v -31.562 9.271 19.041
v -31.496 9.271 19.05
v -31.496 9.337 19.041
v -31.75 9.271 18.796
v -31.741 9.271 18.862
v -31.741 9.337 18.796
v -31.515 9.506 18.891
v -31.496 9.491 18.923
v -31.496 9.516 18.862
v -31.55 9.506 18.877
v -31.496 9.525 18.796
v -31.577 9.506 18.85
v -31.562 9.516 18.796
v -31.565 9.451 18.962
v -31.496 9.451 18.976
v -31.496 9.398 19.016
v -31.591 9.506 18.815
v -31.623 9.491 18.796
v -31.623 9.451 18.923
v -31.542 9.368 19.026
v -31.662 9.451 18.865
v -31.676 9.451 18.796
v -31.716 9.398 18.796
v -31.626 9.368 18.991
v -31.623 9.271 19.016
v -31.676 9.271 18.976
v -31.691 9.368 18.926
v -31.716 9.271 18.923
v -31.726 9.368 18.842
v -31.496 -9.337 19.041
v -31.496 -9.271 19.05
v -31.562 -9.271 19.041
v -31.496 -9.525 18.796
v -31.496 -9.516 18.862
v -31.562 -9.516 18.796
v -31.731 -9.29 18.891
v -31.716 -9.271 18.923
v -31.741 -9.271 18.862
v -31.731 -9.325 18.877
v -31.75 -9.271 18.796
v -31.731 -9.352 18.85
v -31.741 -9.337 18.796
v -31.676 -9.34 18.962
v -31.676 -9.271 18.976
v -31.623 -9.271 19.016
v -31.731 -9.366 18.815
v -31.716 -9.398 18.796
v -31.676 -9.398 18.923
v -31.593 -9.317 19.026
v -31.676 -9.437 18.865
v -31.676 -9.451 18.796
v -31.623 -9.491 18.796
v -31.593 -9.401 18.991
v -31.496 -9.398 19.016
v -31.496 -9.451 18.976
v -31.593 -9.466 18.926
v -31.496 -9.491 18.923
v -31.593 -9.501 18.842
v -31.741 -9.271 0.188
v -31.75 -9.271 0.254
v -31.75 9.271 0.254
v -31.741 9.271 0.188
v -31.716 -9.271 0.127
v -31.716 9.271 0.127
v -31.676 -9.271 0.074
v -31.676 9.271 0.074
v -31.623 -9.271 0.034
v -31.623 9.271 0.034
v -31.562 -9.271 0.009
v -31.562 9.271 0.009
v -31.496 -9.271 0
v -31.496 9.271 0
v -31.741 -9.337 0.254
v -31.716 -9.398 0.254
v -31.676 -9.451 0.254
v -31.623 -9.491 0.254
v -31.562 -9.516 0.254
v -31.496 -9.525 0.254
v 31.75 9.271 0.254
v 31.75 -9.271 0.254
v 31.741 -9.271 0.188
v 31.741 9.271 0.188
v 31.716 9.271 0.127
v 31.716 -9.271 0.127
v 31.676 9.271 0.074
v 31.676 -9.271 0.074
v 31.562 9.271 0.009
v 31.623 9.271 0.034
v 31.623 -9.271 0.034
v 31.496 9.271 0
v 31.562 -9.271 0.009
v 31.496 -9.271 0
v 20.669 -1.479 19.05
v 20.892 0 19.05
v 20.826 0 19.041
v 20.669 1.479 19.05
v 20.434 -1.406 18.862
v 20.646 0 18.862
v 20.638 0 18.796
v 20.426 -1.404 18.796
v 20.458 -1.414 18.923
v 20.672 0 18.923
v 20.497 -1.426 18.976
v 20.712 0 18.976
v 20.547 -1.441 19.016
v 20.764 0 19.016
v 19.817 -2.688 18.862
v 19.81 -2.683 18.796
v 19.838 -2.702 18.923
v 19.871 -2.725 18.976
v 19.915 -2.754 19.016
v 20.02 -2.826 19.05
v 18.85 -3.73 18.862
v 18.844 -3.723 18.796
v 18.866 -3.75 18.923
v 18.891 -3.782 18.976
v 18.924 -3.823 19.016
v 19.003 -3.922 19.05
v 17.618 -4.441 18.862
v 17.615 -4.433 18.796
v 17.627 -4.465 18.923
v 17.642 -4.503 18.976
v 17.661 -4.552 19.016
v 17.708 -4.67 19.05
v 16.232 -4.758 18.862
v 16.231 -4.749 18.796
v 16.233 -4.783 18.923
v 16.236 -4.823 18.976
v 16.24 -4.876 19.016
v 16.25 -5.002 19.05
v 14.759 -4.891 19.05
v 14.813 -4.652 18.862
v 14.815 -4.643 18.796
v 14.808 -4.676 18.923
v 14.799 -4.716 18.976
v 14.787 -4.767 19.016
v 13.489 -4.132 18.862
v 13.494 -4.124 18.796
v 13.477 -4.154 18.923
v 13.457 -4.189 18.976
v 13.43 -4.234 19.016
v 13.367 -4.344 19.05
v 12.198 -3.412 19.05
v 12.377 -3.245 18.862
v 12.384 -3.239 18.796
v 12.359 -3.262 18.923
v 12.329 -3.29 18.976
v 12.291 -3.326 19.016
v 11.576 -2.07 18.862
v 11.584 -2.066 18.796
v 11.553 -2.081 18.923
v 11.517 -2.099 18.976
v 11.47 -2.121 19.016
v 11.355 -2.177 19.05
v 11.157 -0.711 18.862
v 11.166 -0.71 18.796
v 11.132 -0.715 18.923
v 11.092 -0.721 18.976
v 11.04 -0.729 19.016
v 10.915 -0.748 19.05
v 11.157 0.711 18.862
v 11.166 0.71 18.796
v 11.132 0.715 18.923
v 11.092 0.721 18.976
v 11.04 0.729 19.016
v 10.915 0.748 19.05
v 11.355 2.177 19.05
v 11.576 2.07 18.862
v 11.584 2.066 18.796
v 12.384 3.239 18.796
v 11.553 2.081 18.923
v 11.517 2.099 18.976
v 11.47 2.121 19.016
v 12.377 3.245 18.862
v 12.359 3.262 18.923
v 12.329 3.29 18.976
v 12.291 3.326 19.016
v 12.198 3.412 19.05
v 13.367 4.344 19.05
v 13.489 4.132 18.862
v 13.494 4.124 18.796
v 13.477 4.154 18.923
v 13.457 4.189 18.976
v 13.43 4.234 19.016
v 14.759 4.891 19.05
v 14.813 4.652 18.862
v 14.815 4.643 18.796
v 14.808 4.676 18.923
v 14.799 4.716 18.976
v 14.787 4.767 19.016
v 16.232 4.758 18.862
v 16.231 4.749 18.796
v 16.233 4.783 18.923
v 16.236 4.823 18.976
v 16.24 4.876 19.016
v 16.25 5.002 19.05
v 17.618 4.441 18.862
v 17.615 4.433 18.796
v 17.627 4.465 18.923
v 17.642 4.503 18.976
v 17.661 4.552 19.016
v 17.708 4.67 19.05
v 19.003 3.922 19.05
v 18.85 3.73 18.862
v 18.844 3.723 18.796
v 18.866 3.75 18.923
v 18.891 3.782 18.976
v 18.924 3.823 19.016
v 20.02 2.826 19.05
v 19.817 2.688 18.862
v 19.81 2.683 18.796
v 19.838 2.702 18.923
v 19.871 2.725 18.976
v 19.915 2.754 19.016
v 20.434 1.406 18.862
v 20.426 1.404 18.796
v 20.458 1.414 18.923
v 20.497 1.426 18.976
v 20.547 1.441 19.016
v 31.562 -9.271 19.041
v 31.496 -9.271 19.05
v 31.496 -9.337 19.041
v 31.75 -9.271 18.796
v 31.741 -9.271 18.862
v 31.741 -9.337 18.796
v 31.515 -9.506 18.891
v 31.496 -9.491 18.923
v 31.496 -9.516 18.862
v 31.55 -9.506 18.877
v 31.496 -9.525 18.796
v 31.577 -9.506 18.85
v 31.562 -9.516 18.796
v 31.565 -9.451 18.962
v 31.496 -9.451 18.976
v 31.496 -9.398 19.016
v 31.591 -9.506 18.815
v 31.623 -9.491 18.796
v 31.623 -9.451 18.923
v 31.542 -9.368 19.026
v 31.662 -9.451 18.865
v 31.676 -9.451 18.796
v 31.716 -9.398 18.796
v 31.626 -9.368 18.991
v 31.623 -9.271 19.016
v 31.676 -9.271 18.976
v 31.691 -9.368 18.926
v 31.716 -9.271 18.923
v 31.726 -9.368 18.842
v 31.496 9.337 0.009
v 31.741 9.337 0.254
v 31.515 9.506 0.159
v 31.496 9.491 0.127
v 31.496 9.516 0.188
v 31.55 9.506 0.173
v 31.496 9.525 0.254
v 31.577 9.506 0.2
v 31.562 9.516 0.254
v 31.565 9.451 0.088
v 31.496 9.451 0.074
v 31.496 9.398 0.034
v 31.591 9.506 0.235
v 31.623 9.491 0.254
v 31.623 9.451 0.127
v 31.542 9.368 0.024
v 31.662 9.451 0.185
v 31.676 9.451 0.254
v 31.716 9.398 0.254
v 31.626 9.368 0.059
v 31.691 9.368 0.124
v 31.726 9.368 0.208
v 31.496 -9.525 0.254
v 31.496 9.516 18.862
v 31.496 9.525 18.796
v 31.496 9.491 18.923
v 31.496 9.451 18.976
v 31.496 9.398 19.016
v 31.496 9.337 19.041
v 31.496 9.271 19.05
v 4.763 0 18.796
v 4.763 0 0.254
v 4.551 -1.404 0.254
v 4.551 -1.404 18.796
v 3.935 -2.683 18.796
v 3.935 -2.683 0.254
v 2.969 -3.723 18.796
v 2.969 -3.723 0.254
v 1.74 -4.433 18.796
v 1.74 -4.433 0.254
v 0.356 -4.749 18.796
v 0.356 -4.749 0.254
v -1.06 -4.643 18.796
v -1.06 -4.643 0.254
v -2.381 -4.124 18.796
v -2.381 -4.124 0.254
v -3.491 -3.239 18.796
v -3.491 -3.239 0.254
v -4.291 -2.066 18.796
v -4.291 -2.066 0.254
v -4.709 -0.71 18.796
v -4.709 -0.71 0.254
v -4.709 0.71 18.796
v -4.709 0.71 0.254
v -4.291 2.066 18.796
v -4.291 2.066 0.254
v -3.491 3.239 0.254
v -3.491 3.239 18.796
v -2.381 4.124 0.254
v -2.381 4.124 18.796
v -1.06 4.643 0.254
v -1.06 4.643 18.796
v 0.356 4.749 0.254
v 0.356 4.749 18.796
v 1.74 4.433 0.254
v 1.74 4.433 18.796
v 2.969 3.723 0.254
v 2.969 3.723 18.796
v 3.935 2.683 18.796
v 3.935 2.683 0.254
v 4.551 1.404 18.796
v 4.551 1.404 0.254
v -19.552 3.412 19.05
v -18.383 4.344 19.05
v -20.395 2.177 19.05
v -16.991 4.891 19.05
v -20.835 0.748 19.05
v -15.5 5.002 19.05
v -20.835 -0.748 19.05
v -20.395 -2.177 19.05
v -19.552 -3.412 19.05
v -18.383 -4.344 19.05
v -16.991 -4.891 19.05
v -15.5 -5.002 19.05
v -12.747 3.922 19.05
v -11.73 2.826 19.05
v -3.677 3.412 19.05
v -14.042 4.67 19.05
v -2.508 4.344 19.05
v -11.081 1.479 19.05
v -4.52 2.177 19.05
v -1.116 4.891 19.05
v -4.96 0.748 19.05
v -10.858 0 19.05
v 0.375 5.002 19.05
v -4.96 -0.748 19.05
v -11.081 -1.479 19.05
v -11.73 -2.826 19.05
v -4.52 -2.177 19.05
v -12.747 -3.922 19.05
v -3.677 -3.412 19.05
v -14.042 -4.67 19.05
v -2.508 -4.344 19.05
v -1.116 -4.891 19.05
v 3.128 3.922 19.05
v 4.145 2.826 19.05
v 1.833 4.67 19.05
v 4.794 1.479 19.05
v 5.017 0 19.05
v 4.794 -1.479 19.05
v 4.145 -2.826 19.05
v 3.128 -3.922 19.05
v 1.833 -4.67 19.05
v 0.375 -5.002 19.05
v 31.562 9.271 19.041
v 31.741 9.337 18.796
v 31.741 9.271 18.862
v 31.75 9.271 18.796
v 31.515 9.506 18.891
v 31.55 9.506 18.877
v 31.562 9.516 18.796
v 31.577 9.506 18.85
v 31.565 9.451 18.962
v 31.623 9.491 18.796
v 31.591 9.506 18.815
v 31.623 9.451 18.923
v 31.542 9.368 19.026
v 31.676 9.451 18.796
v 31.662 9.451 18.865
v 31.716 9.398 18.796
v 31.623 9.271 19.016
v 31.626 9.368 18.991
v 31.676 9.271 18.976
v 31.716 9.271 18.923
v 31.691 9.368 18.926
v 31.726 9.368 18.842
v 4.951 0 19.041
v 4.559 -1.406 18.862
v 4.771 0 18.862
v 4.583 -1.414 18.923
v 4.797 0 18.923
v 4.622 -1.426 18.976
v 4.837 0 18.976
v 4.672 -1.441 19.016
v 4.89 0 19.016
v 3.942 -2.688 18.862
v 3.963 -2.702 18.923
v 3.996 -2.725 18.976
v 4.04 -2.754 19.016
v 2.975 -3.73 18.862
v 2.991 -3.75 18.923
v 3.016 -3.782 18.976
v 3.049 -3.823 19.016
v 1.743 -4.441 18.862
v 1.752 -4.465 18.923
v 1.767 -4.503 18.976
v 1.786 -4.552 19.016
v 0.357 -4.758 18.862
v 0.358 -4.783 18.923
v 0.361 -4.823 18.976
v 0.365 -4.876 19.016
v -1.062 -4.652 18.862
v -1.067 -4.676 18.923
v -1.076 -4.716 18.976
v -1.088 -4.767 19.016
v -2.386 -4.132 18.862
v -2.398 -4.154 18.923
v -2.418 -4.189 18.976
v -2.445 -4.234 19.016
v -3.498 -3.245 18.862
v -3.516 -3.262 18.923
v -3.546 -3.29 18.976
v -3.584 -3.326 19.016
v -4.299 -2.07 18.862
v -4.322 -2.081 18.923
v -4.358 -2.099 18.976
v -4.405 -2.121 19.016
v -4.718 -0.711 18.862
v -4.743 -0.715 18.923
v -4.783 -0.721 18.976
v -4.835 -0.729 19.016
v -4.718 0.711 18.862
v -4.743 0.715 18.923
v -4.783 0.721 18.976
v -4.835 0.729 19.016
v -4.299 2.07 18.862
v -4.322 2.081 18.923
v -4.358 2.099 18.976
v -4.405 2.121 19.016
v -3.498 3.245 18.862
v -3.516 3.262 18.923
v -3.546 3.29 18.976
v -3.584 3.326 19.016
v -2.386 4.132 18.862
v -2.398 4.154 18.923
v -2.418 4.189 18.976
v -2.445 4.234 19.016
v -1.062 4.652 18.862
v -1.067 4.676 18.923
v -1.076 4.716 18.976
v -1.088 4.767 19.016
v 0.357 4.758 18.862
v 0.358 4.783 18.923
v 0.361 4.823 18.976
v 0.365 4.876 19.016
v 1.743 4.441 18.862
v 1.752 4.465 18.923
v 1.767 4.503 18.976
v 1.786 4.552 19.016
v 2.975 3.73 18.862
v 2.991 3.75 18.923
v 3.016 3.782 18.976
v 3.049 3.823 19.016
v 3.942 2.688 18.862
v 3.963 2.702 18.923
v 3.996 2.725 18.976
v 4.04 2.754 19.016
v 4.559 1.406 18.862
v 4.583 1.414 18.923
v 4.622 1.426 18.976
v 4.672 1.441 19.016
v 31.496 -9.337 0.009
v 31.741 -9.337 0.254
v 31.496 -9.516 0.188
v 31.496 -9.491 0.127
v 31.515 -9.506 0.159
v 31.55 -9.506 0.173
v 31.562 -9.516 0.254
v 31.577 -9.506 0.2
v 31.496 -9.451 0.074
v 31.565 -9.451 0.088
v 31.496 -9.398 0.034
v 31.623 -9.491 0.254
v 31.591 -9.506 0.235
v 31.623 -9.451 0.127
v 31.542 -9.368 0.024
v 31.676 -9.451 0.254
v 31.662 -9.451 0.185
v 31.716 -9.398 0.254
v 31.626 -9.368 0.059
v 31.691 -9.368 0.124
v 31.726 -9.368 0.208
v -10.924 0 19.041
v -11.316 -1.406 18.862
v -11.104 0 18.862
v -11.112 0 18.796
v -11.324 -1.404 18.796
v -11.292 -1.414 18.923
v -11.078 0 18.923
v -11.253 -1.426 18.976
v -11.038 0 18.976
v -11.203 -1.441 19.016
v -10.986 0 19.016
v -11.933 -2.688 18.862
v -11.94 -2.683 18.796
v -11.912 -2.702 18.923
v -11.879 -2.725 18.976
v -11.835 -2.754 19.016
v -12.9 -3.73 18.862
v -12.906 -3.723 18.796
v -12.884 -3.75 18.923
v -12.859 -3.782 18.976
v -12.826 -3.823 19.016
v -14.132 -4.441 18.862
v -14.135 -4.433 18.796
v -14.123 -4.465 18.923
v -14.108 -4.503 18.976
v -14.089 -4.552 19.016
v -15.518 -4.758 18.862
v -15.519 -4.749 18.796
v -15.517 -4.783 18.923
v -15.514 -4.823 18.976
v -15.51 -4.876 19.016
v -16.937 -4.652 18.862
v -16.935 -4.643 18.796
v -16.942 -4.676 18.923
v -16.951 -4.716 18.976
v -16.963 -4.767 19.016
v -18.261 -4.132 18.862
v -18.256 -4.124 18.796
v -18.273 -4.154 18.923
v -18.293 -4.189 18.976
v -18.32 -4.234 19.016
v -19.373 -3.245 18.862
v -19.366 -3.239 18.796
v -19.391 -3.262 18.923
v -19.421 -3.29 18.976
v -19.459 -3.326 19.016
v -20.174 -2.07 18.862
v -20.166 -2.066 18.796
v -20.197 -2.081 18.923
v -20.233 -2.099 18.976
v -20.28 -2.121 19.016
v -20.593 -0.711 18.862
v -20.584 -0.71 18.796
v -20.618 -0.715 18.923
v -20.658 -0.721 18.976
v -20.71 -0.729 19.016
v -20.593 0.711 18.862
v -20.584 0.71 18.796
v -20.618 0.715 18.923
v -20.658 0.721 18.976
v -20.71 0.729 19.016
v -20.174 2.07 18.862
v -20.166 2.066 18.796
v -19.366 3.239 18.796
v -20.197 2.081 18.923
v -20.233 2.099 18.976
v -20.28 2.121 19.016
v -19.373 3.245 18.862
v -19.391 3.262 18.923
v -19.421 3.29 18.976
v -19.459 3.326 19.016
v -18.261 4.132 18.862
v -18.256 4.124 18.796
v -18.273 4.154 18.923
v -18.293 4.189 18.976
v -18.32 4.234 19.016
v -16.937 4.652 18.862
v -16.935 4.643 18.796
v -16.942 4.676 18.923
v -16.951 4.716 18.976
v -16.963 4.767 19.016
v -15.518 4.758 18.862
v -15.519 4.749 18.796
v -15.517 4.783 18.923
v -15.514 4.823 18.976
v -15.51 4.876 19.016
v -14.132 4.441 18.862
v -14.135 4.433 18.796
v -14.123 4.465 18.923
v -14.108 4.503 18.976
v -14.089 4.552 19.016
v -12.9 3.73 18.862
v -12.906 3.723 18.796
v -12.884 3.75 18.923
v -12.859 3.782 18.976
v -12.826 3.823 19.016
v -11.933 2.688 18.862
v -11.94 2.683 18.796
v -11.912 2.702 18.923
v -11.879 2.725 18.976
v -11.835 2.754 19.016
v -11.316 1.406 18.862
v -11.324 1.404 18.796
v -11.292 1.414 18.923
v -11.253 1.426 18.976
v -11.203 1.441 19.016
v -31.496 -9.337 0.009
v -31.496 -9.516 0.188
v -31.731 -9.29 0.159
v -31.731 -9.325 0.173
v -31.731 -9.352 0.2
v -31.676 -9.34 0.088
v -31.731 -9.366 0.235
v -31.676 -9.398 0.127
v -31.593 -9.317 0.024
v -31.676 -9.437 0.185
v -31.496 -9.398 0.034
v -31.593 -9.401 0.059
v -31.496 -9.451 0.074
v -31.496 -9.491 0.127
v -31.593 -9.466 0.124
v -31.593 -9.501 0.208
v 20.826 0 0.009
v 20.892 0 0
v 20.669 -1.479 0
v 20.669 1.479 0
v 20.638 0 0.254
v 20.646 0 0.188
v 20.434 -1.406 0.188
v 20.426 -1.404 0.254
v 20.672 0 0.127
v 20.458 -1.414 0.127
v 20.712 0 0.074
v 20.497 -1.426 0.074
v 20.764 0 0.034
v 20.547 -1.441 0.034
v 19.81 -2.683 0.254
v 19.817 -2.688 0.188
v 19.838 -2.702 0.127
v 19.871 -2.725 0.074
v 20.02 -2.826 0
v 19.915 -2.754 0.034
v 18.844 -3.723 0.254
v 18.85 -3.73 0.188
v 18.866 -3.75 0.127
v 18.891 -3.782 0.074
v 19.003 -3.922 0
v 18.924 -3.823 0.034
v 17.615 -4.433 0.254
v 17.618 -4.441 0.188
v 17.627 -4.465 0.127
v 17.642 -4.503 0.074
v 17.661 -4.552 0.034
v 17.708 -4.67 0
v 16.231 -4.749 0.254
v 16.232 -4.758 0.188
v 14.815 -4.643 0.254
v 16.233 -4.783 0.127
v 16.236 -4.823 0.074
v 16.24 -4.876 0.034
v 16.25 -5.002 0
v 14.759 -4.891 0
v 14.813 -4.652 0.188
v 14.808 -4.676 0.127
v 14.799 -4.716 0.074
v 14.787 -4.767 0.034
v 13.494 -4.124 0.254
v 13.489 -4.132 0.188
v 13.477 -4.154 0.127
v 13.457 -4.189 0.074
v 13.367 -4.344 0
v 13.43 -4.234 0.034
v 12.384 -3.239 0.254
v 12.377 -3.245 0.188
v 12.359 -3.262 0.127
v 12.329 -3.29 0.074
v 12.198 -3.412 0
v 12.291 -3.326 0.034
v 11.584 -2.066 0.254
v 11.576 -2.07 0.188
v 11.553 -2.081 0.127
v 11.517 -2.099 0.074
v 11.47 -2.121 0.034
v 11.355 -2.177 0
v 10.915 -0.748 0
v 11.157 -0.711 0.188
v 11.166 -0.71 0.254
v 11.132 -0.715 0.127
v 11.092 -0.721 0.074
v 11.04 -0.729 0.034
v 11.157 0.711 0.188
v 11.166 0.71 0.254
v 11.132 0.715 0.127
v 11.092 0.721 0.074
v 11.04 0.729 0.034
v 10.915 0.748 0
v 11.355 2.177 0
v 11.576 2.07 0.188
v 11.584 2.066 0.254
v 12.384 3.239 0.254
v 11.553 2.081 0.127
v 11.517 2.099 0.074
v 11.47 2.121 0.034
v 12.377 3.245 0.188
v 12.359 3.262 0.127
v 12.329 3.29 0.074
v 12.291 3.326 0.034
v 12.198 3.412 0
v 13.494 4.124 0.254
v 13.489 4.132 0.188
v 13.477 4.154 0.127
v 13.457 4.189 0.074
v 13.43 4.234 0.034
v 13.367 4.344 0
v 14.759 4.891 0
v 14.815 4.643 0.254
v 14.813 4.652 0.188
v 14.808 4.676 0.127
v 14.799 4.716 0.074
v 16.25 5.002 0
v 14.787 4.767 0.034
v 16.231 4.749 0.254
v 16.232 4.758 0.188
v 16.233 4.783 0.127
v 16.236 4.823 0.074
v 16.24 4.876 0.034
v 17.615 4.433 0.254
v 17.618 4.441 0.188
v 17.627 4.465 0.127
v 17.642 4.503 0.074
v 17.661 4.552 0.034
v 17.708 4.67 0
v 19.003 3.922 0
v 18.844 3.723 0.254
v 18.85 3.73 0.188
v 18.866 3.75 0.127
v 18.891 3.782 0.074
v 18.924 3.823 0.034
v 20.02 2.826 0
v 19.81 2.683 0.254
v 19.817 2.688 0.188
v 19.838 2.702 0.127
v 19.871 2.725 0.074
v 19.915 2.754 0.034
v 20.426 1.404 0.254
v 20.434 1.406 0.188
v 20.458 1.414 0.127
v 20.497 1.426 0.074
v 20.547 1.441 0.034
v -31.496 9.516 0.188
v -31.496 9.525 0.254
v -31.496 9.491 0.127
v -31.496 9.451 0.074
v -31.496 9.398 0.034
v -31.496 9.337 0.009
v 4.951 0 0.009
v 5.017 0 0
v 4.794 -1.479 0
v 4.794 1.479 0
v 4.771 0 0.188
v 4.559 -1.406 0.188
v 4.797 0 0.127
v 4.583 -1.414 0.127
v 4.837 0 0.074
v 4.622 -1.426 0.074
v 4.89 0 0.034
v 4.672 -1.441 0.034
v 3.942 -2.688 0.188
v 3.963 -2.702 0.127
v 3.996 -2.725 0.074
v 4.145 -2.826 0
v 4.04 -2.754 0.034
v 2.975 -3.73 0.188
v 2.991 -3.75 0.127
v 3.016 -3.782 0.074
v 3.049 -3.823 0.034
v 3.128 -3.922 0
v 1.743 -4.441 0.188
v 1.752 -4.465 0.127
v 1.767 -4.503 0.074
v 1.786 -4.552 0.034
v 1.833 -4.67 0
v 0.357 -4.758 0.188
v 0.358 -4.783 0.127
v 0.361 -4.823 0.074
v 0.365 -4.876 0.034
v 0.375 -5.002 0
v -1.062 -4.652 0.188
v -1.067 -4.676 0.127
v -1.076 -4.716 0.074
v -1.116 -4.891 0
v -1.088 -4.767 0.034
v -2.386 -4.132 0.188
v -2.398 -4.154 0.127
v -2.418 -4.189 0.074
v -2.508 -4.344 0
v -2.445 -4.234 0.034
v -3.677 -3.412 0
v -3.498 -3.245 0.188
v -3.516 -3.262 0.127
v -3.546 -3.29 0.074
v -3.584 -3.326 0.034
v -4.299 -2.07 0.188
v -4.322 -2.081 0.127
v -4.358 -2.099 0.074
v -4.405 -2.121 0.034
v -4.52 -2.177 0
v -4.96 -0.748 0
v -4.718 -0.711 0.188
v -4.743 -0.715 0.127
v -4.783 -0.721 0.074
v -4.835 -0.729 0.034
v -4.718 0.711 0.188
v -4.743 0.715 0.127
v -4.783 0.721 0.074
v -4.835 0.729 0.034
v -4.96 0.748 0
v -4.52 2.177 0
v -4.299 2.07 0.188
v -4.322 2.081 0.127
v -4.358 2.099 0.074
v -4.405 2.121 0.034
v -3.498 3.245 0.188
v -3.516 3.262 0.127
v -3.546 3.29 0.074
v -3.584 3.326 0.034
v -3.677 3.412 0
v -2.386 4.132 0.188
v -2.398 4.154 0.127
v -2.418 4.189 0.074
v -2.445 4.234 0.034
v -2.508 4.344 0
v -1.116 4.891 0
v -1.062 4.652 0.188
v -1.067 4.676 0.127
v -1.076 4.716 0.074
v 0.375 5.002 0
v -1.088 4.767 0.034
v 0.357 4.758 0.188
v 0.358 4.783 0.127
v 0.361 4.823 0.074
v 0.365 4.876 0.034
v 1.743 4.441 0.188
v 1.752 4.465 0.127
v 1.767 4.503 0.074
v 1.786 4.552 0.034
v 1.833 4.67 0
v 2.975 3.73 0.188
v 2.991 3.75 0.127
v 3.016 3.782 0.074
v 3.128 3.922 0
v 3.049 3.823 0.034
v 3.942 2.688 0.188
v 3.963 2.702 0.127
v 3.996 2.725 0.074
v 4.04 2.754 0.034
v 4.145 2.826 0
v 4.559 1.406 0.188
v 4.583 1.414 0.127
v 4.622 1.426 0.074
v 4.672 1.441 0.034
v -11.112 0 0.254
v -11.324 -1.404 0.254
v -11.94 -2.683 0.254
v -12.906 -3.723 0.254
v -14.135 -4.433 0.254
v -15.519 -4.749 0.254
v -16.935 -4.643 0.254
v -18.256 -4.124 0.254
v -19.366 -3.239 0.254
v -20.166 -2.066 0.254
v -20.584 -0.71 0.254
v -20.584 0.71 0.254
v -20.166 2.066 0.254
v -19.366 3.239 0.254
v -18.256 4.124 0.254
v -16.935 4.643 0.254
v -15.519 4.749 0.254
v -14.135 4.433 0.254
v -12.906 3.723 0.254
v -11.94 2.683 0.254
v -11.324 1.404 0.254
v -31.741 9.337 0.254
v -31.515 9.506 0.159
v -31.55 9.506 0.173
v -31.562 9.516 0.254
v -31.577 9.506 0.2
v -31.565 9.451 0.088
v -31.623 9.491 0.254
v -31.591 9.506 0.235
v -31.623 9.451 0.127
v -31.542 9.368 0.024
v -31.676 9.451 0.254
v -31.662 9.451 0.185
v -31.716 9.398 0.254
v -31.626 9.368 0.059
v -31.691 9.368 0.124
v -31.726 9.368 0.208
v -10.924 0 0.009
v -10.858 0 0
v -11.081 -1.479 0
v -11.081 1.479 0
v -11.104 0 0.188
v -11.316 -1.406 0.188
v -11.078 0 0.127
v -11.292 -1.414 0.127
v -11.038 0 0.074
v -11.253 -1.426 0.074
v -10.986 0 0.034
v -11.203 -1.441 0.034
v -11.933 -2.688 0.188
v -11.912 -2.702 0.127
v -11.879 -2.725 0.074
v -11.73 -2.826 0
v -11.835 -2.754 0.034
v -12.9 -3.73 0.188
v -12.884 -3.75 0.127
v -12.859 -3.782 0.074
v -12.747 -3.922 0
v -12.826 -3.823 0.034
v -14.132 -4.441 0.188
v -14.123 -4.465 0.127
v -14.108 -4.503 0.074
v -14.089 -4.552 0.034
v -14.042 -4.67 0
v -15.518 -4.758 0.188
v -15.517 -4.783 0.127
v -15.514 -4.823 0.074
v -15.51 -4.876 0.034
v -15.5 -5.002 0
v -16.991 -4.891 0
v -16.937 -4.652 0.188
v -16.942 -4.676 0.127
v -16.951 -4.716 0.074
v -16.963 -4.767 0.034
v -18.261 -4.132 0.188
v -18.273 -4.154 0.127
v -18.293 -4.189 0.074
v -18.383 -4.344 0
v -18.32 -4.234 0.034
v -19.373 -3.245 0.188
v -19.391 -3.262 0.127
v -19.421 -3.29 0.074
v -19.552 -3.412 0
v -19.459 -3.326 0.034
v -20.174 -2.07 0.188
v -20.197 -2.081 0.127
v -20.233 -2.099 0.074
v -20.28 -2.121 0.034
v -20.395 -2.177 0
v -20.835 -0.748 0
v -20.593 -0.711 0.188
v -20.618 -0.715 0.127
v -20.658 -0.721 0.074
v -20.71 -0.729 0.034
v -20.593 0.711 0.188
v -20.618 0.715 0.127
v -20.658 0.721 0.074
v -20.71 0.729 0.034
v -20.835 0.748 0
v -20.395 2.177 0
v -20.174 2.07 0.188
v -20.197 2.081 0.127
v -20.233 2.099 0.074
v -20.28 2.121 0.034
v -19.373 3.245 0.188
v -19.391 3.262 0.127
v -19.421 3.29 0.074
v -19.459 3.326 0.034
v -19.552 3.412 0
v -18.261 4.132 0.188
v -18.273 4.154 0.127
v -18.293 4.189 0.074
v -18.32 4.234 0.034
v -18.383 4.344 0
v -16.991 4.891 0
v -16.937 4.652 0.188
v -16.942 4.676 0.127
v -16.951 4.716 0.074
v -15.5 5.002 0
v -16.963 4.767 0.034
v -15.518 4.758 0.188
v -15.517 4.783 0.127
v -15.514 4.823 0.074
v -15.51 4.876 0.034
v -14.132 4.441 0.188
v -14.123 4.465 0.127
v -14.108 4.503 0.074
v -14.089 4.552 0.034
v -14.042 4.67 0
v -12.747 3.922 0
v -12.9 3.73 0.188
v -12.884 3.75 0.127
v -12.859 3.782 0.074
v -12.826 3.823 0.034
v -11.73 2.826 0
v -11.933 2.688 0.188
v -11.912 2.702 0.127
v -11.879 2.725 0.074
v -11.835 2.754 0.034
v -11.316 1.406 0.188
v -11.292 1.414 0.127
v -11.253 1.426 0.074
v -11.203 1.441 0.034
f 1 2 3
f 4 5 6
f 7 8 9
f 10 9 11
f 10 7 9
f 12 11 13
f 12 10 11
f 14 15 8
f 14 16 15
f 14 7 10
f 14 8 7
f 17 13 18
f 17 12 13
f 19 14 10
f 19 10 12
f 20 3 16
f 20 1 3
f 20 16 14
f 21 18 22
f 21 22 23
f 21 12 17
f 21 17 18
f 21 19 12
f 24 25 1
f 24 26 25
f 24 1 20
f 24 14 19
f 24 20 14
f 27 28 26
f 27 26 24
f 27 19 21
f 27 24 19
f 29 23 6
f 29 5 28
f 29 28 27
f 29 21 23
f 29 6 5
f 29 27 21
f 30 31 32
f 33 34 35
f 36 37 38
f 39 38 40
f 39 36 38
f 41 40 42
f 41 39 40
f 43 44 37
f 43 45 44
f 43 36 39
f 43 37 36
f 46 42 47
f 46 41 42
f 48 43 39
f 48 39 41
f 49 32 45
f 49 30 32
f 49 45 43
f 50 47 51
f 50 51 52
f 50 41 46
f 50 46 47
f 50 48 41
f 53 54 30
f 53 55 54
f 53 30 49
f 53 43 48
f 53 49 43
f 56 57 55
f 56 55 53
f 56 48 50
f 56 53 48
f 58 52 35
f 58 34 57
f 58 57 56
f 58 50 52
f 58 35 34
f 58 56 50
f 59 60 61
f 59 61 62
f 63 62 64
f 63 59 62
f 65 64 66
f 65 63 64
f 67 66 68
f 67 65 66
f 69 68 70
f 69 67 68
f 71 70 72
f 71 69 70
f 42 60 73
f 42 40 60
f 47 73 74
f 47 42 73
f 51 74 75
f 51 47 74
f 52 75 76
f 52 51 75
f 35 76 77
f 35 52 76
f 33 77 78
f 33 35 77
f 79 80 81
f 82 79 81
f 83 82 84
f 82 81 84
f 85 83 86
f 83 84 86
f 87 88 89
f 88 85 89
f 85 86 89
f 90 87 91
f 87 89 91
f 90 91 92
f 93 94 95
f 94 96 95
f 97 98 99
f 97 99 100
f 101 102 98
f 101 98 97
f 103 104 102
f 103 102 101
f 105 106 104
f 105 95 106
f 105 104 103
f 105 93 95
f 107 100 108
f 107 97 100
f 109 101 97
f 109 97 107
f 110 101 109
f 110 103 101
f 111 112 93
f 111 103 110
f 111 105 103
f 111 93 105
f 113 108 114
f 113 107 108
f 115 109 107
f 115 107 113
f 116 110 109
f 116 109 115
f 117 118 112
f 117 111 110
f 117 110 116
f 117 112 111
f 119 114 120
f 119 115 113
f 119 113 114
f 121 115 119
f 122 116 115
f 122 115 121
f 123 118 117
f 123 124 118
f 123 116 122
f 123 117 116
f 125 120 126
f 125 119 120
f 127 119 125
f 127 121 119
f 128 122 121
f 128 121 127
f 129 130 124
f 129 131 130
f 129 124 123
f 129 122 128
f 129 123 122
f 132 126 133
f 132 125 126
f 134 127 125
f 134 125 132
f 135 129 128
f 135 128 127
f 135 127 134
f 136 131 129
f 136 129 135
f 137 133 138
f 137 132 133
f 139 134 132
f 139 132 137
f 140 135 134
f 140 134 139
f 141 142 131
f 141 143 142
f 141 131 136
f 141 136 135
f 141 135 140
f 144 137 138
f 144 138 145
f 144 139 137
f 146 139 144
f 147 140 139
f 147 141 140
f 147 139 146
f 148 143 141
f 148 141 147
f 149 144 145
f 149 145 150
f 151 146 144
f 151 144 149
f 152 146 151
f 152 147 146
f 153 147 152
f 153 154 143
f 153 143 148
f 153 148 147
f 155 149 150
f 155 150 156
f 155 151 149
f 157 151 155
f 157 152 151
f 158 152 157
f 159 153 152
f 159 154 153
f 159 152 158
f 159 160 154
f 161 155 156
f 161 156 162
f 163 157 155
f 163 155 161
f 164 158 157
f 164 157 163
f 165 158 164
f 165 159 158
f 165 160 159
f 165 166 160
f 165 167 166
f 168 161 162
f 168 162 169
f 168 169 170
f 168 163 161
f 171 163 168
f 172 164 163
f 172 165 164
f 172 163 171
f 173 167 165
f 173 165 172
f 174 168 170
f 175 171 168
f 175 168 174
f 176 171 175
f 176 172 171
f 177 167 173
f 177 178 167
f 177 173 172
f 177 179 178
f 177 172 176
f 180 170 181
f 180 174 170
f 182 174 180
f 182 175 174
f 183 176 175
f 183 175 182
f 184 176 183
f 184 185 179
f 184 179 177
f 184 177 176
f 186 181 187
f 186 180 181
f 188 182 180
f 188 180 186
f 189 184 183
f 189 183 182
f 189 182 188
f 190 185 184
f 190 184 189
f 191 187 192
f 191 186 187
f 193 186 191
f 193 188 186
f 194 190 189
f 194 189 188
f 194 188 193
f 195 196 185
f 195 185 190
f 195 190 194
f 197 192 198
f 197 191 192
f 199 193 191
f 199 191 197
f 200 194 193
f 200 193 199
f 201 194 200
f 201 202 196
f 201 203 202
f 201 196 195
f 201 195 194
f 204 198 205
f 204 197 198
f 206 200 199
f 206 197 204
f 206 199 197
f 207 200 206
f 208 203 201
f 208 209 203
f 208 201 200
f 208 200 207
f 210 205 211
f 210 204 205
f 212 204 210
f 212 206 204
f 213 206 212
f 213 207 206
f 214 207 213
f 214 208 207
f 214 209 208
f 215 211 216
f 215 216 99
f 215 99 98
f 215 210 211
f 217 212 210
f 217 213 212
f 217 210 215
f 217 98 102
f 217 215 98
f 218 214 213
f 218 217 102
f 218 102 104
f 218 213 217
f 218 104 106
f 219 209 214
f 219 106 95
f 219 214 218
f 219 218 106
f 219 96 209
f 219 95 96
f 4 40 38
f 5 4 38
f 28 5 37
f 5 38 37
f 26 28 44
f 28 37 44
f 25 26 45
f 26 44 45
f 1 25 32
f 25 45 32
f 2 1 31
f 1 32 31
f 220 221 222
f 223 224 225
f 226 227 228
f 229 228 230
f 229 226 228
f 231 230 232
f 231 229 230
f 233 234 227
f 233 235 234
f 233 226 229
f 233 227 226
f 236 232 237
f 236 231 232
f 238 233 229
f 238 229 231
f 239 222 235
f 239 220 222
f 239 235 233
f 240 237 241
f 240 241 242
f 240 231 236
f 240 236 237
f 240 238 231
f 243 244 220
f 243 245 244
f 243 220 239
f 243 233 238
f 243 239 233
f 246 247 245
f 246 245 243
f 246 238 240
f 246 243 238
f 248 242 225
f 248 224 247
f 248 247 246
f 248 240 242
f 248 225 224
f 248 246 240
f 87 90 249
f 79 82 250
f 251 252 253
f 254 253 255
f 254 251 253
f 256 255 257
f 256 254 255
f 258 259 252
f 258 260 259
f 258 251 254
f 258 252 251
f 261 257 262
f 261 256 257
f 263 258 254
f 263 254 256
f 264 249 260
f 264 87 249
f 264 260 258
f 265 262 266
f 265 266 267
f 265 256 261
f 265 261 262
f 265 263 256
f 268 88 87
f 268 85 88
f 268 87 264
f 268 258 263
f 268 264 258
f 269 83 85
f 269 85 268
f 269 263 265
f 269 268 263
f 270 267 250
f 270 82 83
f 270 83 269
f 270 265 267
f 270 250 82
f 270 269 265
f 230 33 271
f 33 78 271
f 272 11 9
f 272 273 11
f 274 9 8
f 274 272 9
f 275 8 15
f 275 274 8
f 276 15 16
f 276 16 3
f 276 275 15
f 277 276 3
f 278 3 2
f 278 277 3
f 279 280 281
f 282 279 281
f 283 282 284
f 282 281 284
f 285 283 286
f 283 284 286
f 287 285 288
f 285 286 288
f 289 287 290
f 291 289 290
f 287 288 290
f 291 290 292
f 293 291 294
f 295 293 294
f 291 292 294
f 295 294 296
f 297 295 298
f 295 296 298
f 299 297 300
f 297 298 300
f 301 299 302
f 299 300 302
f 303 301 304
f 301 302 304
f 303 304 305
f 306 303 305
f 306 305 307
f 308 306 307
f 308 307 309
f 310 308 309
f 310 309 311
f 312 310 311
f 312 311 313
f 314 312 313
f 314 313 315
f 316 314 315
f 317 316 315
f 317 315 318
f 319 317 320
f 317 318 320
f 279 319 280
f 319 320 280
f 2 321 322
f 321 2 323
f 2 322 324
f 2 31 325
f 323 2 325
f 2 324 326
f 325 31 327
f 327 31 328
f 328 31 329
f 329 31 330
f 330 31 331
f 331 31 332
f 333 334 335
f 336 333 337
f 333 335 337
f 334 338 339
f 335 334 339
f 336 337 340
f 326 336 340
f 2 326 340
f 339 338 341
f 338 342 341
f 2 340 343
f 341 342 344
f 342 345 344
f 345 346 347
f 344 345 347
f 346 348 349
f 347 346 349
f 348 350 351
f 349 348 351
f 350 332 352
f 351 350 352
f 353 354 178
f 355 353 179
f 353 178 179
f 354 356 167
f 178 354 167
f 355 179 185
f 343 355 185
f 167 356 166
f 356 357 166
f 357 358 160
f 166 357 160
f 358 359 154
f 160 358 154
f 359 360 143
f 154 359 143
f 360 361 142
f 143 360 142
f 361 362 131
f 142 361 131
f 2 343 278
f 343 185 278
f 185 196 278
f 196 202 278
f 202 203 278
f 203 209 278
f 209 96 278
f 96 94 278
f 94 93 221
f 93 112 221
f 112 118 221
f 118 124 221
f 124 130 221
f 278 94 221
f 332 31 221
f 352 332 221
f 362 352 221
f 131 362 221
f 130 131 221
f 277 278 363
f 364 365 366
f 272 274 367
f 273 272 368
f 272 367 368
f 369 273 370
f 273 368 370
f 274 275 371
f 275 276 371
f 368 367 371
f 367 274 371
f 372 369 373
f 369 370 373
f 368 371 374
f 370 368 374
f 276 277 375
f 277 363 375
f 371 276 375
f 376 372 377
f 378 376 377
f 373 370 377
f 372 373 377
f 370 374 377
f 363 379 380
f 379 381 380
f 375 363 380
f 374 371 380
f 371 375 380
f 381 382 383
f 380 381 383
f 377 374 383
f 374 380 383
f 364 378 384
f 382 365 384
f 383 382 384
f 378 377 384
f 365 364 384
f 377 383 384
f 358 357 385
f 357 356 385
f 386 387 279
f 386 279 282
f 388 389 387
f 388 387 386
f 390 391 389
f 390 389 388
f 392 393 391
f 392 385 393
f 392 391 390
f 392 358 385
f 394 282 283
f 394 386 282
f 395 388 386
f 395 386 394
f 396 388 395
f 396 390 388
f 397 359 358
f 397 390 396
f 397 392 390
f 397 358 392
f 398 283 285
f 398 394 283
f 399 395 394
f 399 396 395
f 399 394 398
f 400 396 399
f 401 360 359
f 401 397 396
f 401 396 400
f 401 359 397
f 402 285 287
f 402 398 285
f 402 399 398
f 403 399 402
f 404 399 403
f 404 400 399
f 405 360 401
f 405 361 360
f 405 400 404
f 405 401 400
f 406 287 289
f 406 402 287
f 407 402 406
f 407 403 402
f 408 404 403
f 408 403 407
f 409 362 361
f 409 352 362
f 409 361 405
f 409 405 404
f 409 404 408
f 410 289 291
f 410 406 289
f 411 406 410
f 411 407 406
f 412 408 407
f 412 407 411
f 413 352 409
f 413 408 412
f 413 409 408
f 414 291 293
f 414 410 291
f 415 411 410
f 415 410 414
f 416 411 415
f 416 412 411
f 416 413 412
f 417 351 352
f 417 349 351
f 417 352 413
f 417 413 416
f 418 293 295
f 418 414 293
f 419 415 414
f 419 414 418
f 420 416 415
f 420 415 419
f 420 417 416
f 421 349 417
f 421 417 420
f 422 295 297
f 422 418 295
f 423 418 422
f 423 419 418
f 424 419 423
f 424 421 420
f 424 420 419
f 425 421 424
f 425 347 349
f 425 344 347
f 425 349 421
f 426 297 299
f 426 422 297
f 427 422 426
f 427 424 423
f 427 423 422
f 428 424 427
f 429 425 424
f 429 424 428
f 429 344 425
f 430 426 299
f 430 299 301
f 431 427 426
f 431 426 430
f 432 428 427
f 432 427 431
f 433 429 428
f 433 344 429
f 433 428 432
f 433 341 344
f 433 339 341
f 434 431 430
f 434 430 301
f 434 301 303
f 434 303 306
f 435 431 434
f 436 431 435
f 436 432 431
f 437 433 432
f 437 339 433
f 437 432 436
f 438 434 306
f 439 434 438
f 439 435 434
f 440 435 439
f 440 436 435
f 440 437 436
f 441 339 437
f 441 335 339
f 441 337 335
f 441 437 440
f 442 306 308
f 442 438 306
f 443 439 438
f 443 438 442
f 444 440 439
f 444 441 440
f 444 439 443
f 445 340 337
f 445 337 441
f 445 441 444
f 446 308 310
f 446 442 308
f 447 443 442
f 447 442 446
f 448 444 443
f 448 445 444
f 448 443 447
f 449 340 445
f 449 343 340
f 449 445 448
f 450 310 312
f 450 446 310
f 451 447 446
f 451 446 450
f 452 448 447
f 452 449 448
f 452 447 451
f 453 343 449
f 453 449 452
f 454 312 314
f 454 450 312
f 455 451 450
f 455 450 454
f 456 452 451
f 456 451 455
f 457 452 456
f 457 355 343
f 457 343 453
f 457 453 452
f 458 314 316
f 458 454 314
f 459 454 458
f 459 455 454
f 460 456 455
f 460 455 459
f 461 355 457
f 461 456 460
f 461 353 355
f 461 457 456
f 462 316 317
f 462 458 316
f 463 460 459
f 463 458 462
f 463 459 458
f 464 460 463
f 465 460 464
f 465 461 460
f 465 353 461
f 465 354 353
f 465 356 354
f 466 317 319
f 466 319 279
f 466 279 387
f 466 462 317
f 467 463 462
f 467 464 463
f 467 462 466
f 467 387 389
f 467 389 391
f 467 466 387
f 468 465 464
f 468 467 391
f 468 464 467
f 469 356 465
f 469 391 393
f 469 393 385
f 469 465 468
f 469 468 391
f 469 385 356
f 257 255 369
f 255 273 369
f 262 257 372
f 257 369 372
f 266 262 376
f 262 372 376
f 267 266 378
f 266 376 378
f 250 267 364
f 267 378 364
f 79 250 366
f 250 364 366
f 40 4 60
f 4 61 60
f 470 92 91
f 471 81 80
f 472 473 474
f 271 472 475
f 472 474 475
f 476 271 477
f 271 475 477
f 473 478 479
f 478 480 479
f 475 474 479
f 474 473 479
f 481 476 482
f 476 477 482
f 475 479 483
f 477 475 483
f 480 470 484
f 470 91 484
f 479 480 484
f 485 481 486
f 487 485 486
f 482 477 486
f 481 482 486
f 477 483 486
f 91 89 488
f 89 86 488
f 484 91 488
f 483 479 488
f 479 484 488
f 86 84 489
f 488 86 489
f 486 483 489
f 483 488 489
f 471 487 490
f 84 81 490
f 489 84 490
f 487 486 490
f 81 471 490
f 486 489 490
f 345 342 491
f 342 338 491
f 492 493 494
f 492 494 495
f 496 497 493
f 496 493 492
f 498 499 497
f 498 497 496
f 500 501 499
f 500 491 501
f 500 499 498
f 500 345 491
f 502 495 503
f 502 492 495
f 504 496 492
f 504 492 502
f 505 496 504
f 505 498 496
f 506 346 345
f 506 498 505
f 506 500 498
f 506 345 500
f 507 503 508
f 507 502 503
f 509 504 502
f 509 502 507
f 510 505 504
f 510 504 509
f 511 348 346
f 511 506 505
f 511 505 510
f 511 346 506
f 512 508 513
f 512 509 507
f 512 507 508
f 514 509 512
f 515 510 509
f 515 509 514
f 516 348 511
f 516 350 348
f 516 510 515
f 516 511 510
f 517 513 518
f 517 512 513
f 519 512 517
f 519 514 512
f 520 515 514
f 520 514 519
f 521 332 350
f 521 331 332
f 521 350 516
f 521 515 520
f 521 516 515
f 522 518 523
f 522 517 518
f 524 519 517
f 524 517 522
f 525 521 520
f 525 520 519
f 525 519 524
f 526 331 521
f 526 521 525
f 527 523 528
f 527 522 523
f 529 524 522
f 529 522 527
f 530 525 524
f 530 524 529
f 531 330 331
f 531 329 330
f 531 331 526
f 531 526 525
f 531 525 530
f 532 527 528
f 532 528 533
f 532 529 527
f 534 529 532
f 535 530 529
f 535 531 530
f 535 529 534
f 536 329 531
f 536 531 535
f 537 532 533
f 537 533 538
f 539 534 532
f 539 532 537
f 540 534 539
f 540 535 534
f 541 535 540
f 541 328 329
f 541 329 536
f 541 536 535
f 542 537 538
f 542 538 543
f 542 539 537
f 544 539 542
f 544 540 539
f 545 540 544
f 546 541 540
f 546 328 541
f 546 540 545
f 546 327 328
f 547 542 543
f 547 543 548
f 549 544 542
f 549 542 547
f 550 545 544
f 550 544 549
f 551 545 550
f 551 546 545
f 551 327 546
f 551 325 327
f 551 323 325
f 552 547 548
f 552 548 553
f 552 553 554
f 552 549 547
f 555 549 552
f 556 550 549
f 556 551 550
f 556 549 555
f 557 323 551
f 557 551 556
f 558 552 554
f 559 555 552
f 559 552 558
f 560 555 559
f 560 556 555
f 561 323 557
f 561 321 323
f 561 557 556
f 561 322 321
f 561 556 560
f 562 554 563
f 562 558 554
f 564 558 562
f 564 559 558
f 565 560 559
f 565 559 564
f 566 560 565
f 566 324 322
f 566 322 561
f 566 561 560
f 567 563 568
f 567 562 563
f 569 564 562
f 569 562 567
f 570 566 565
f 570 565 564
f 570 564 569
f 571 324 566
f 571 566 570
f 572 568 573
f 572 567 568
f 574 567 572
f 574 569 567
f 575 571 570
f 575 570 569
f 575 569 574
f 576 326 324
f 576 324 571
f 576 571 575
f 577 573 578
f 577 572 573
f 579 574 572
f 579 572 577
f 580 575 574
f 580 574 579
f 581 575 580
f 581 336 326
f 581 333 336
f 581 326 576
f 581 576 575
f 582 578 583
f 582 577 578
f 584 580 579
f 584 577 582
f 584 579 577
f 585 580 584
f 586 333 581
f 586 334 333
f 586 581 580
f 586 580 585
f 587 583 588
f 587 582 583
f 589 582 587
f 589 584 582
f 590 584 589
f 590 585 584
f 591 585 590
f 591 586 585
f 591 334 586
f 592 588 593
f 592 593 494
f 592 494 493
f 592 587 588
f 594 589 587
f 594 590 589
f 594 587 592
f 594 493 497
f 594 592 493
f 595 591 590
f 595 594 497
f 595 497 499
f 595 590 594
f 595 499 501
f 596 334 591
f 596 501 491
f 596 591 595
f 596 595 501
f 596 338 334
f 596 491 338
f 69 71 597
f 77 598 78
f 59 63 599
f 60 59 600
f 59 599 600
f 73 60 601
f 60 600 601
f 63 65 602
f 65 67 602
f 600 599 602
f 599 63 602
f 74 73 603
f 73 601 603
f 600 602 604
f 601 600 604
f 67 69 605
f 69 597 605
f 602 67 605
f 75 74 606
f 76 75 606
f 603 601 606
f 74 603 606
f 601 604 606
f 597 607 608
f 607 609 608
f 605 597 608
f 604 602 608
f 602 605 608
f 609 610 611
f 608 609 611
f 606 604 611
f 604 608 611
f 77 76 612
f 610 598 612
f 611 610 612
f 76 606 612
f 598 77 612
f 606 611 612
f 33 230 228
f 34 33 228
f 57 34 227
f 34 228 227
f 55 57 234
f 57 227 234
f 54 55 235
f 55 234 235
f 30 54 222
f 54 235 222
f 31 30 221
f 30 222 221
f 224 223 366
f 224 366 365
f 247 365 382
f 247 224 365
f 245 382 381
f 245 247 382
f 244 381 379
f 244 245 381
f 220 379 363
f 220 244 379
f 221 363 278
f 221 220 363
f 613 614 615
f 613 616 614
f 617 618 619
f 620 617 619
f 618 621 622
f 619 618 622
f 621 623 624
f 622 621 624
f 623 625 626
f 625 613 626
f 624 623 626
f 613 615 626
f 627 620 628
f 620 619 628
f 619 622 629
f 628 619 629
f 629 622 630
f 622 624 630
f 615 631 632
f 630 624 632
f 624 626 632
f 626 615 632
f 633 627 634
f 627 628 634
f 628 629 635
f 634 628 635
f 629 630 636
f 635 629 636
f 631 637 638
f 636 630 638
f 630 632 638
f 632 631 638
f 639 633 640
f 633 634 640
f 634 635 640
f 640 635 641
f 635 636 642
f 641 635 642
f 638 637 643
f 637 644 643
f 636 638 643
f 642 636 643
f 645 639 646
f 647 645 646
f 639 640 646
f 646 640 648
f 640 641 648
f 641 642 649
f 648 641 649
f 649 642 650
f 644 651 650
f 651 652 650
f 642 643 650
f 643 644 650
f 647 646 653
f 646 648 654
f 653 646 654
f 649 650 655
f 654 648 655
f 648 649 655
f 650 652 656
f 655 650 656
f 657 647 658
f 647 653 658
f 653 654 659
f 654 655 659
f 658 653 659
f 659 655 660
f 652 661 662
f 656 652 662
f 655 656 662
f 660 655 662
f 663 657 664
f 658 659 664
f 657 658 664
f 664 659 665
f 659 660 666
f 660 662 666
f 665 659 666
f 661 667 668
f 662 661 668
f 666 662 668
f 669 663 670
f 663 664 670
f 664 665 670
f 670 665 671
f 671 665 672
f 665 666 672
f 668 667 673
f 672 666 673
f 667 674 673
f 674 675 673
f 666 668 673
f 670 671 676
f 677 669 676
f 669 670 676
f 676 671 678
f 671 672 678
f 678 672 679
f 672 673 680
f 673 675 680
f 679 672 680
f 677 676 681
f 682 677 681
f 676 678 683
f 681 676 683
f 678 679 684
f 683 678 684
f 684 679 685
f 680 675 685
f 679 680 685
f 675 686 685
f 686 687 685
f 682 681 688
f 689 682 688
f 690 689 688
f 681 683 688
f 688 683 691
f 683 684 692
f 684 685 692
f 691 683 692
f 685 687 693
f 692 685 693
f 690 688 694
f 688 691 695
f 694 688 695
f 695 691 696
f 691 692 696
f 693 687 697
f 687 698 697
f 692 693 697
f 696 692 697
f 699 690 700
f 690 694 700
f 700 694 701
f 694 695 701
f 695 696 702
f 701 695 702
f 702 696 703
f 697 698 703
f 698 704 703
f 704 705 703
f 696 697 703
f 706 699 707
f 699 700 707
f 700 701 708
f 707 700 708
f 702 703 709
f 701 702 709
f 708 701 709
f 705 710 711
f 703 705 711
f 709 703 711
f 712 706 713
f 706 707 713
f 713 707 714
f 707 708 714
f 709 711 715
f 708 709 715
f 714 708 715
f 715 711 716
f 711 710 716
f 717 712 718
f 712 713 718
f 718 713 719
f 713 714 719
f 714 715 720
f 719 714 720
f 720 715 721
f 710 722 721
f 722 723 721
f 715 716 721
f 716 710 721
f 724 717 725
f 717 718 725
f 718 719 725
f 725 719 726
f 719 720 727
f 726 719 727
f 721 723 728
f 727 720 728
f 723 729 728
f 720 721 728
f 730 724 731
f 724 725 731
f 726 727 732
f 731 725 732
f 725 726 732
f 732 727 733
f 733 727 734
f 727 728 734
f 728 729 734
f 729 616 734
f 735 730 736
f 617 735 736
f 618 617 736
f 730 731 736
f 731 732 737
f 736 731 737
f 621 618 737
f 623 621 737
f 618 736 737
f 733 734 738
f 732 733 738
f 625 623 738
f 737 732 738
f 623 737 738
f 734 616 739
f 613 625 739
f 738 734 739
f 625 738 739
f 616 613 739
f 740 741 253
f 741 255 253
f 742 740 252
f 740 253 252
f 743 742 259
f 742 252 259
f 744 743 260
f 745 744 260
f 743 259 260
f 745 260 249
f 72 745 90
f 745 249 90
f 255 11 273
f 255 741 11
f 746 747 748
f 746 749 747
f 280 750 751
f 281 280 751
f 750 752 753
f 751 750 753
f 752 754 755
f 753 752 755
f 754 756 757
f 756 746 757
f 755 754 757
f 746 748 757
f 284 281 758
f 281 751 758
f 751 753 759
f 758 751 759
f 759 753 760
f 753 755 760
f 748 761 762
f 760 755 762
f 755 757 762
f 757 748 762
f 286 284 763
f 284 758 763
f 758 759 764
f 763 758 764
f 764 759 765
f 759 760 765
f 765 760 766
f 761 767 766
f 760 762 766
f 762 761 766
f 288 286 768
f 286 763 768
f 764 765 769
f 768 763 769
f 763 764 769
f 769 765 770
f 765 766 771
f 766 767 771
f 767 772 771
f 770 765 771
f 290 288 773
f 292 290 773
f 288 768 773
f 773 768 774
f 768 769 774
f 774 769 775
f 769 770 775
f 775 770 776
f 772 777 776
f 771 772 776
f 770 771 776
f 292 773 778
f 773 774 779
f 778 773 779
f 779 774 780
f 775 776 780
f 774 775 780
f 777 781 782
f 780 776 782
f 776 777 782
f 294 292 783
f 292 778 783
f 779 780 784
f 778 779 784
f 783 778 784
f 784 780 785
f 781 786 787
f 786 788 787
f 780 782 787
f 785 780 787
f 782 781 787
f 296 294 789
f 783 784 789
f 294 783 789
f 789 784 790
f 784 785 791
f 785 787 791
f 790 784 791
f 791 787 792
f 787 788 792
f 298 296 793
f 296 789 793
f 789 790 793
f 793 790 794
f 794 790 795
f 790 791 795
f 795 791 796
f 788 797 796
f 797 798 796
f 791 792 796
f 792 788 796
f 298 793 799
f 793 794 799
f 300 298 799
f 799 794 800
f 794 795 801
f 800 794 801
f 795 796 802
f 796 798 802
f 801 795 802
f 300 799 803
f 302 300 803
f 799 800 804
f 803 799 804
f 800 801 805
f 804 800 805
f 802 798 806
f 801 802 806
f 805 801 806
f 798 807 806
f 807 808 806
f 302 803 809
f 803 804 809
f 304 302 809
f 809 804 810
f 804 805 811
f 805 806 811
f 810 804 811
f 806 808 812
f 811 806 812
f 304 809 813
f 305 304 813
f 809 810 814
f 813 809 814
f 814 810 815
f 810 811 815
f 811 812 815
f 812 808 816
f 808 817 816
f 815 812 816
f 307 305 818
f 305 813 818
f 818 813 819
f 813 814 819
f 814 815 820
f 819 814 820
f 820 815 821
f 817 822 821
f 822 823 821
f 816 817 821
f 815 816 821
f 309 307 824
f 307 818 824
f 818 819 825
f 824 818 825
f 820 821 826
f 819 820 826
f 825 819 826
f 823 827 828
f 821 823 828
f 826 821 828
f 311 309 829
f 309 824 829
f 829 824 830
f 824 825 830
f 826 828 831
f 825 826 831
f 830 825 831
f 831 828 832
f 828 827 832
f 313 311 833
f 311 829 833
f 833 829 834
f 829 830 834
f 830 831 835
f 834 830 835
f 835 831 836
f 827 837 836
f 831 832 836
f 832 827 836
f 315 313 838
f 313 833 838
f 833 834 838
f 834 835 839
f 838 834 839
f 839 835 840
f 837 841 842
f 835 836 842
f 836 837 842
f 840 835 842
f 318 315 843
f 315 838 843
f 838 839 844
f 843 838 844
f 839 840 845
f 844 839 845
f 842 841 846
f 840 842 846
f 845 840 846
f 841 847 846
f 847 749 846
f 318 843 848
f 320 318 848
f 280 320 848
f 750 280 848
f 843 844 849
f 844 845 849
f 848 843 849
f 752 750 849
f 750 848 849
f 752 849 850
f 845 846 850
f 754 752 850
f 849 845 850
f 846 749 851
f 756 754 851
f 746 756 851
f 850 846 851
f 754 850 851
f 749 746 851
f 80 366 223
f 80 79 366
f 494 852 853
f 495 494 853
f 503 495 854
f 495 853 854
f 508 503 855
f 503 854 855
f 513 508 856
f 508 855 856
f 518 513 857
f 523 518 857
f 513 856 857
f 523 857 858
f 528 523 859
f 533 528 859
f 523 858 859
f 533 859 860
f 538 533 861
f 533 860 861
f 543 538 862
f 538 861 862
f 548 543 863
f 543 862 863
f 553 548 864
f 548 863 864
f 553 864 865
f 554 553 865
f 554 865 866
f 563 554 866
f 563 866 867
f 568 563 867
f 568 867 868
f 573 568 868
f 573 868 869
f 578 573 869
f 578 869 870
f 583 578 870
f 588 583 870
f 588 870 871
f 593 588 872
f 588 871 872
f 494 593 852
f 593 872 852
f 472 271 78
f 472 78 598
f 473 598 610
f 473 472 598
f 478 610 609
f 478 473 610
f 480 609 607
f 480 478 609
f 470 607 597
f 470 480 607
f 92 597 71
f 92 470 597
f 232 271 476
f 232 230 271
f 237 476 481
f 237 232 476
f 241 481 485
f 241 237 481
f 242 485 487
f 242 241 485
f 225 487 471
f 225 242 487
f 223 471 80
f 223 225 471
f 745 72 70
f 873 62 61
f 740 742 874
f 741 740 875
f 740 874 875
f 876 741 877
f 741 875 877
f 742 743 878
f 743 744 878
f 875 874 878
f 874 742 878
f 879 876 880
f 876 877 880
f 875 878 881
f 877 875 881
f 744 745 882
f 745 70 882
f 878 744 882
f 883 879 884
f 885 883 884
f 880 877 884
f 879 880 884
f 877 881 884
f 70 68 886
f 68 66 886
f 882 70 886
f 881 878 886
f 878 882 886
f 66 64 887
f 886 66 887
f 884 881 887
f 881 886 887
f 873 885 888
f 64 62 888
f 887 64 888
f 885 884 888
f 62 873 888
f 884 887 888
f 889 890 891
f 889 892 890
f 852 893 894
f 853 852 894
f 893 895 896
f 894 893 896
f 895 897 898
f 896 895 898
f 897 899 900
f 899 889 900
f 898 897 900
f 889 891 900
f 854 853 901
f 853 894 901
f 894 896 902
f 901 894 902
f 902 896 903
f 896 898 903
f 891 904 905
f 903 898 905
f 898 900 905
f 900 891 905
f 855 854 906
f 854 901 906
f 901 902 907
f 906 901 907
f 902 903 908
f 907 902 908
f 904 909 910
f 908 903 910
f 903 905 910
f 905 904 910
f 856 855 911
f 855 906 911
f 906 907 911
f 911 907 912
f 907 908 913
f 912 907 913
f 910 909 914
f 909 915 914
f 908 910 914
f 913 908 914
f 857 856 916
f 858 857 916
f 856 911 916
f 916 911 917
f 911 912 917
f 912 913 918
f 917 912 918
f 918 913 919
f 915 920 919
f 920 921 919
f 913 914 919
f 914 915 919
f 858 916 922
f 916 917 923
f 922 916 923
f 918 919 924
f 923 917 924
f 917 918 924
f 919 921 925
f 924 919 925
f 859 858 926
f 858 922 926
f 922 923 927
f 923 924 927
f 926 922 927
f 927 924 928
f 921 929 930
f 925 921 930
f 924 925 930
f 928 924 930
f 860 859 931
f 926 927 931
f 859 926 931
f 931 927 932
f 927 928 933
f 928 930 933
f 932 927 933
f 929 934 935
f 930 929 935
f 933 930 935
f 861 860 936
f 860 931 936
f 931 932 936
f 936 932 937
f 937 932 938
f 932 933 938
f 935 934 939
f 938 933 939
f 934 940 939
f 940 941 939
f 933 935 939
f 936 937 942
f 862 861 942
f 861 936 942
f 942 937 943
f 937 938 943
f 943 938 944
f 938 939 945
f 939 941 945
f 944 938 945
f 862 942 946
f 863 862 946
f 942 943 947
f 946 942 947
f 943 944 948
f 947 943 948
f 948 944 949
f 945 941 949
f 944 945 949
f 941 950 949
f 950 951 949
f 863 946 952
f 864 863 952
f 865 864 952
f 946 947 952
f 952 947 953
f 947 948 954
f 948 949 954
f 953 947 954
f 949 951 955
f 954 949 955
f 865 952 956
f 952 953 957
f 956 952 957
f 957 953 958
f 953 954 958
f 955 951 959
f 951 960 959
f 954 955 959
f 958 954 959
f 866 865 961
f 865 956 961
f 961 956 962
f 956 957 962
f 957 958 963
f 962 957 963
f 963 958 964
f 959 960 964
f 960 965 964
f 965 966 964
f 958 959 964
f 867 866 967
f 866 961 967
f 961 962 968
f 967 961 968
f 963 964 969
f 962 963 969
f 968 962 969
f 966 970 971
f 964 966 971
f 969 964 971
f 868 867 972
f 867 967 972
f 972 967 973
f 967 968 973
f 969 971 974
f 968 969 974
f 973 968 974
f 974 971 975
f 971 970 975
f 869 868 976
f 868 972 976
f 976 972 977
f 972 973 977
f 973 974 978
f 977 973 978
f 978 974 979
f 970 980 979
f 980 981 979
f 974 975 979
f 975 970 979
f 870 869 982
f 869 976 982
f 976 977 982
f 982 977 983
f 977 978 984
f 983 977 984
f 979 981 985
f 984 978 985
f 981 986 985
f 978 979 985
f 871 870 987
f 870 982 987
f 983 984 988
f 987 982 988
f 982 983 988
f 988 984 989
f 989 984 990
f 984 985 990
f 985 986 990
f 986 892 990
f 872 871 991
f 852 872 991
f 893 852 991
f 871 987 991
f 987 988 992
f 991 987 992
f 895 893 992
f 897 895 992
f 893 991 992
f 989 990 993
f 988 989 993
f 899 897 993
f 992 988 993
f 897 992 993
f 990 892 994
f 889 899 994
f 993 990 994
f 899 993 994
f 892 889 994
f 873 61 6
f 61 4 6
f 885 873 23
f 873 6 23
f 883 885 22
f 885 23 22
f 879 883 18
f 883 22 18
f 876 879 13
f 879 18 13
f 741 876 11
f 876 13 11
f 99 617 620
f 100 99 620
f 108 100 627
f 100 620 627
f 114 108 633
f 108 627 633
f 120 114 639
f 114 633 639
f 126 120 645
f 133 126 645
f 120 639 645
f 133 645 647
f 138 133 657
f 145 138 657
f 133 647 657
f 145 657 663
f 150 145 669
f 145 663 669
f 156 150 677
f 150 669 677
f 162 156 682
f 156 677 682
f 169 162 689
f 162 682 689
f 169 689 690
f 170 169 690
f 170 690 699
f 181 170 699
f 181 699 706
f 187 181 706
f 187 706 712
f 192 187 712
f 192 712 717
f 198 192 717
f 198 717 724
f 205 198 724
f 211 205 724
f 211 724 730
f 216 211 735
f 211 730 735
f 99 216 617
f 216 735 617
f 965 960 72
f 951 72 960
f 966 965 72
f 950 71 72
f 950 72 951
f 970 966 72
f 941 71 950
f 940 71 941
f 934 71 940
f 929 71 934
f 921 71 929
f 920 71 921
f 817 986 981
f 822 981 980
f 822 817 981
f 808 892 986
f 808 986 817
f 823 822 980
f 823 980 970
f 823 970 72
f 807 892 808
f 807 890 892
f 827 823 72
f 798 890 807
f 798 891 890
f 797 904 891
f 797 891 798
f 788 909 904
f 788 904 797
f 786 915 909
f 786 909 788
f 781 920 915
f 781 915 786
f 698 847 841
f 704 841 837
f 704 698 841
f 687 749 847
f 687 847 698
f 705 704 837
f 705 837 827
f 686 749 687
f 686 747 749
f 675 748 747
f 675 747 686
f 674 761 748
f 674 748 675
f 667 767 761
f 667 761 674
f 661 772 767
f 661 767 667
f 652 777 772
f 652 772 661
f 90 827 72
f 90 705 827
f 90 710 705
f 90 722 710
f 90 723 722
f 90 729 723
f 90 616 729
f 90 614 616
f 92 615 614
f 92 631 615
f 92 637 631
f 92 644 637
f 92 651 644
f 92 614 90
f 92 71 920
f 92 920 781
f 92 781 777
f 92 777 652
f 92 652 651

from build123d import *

# Parameters (mm, degrees)
F0_W     = 63.5
F0_H     = 19.05
F0_R     = 4.7625
F1_DEPTH = 19.05
F3_R     = 0.254
F4_ANGLE = 90


with BuildPart() as f1:
    # F0 (on Front) → F1 (new body)
    with BuildSketch(Plane.XZ):
        Rectangle(F0_W, F0_H)
        with Locations((-15.875, 0)):
            Circle(F0_R, mode=Mode.SUBTRACT)
        Circle(F0_R, mode=Mode.SUBTRACT)
        with Locations((15.875, 0)):
            Circle(F0_R, mode=Mode.SUBTRACT)
    extrude(amount=-F1_DEPTH)

    # F3
    f3_edges = [f1.edges().sort_by_distance(p)[0] for p in [
        (31.75, 19.05, 0),
        (0, 19.05, 9.525),
        (-31.75, 19.05, 0),
        (0, 19.05, -9.525),
        (-20.6375, 19.05, 0),
        (-4.7625, 19.05, 0),
        (11.1125, 19.05, 0),
        (31.75, 0, 0),
        (0, 0, 9.525),
        (-31.75, 0, 0),
        (0, 0, -9.525),
        (-20.6375, 0, 0),
        (-4.7625, 0, 0),
        (11.1125, 0, 0),
        (31.75, 9.525, -9.525),
        (31.75, 9.525, 9.525),
        (-31.75, 9.525, 9.525),
        (-31.75, 9.525, -9.525),
    ]]
    fillet(f3_edges, radius=F3_R)


with BuildPart() as f1_1:
    # F4: moved
    add(f1.part.rotate(Axis((7.9375, 0, 0), (1, 0, 0)), F4_ANGLE))


solid = f1_1.part
